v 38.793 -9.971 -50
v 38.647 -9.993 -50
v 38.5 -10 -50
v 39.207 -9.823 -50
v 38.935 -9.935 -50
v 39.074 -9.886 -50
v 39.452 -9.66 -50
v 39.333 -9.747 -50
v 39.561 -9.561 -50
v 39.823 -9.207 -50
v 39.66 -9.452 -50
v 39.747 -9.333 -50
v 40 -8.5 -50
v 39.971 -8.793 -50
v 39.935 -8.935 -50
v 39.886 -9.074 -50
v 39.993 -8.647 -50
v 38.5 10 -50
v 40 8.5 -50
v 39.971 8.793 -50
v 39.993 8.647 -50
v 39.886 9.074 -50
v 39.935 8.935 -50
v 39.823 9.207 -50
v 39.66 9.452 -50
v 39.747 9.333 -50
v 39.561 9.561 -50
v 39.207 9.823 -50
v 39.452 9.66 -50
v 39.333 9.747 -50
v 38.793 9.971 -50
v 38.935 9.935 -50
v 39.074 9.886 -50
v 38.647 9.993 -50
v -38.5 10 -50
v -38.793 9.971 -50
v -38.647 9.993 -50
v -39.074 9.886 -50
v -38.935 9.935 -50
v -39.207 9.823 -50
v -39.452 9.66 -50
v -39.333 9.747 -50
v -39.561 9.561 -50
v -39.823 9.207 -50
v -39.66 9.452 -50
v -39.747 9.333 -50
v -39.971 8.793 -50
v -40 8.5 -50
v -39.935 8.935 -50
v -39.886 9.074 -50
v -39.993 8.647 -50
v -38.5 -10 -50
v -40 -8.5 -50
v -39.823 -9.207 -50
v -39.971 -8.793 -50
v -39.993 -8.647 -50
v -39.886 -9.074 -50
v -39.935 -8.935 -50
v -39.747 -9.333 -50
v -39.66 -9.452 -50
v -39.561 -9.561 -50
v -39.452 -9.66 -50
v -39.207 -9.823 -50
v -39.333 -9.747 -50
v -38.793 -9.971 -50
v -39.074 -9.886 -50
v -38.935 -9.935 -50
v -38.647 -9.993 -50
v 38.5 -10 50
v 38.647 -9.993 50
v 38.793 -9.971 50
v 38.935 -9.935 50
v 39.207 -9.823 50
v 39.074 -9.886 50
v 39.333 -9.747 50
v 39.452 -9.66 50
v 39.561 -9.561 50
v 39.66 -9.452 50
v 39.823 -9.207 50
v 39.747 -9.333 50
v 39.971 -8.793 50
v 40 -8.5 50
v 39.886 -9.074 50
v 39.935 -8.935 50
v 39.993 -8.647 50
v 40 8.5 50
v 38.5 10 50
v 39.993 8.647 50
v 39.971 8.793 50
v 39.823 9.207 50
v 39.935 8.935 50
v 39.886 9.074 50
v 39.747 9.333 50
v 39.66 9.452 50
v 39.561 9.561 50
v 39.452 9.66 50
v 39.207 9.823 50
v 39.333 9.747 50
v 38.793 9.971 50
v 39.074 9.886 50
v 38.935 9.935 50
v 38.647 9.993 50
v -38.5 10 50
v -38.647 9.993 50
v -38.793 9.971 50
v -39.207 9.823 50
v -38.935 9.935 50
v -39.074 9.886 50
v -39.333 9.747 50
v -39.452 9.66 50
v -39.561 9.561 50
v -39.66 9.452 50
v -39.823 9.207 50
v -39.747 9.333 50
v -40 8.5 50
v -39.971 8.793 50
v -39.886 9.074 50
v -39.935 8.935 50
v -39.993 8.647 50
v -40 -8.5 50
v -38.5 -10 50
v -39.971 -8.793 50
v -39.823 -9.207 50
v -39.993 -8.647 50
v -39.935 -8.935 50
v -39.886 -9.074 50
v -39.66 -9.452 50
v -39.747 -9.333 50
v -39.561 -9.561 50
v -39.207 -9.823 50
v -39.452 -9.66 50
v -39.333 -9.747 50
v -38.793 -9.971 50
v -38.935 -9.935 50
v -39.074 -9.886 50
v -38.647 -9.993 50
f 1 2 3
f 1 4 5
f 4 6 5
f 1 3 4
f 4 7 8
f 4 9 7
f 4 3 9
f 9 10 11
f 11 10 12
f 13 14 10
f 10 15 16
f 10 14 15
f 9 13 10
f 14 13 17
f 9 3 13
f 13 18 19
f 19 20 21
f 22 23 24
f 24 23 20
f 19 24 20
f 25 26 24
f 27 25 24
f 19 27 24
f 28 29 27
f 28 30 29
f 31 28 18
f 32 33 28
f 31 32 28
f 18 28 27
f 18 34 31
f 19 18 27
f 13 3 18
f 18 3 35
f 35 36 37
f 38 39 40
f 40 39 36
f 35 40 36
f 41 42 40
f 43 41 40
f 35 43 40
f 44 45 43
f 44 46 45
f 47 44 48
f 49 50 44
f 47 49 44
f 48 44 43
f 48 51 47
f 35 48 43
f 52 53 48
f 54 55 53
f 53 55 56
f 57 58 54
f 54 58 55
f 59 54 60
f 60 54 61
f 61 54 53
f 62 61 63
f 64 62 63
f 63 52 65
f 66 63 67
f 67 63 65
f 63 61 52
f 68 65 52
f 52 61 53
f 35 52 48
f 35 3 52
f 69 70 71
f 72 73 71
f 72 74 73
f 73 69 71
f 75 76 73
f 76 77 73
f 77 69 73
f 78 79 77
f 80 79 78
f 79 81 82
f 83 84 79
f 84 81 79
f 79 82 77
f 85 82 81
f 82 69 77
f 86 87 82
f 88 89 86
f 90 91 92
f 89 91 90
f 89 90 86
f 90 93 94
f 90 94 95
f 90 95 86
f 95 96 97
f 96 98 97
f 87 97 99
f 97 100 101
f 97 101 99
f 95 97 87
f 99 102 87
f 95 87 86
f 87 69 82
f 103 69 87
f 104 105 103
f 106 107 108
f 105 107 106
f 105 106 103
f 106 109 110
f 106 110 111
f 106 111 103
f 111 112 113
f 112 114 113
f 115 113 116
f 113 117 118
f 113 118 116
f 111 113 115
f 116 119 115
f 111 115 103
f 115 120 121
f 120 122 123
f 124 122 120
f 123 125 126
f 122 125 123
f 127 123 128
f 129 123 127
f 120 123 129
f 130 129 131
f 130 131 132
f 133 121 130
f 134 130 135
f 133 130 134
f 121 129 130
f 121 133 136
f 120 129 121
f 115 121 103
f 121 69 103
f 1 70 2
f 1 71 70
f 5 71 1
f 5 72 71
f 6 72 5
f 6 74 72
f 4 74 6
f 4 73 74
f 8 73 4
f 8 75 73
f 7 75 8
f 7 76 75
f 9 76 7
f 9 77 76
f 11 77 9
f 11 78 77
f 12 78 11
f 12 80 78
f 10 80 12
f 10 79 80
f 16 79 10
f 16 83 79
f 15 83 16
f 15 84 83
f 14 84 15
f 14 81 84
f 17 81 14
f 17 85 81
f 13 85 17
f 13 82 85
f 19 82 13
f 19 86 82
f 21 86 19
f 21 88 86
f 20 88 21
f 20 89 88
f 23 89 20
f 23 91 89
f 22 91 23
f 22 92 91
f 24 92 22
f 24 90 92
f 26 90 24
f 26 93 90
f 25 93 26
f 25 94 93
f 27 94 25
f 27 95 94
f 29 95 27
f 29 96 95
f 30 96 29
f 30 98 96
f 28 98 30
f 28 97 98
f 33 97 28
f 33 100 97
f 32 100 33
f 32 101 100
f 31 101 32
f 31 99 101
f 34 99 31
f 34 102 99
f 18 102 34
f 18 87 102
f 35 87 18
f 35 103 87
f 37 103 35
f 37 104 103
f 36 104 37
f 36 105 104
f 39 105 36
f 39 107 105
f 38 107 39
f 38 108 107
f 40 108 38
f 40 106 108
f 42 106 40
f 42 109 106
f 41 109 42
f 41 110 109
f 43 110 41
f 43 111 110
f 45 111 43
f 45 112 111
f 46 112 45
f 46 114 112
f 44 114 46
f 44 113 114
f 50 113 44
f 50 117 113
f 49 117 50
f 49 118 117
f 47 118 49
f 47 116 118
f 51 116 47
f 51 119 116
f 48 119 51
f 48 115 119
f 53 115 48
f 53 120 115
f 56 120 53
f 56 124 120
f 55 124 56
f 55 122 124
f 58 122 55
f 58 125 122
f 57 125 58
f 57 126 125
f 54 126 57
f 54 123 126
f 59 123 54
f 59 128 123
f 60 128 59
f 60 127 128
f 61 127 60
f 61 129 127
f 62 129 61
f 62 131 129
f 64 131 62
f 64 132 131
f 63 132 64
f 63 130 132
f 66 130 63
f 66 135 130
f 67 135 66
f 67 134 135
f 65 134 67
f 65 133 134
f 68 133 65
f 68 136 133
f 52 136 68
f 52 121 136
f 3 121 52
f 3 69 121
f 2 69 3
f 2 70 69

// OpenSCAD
$fn=64;

module tslot_2080_profile(len=100, w=80, h=20, corner_r=1.5) {
    linear_extrude(height=len, center=true, convexity=10)
        offset(r=corner_r)
            square([w-2*corner_r, h-2*corner_r], center=true);
}

tslot_2080_profile(len=100, w=80, h=20, corner_r=1.5);
